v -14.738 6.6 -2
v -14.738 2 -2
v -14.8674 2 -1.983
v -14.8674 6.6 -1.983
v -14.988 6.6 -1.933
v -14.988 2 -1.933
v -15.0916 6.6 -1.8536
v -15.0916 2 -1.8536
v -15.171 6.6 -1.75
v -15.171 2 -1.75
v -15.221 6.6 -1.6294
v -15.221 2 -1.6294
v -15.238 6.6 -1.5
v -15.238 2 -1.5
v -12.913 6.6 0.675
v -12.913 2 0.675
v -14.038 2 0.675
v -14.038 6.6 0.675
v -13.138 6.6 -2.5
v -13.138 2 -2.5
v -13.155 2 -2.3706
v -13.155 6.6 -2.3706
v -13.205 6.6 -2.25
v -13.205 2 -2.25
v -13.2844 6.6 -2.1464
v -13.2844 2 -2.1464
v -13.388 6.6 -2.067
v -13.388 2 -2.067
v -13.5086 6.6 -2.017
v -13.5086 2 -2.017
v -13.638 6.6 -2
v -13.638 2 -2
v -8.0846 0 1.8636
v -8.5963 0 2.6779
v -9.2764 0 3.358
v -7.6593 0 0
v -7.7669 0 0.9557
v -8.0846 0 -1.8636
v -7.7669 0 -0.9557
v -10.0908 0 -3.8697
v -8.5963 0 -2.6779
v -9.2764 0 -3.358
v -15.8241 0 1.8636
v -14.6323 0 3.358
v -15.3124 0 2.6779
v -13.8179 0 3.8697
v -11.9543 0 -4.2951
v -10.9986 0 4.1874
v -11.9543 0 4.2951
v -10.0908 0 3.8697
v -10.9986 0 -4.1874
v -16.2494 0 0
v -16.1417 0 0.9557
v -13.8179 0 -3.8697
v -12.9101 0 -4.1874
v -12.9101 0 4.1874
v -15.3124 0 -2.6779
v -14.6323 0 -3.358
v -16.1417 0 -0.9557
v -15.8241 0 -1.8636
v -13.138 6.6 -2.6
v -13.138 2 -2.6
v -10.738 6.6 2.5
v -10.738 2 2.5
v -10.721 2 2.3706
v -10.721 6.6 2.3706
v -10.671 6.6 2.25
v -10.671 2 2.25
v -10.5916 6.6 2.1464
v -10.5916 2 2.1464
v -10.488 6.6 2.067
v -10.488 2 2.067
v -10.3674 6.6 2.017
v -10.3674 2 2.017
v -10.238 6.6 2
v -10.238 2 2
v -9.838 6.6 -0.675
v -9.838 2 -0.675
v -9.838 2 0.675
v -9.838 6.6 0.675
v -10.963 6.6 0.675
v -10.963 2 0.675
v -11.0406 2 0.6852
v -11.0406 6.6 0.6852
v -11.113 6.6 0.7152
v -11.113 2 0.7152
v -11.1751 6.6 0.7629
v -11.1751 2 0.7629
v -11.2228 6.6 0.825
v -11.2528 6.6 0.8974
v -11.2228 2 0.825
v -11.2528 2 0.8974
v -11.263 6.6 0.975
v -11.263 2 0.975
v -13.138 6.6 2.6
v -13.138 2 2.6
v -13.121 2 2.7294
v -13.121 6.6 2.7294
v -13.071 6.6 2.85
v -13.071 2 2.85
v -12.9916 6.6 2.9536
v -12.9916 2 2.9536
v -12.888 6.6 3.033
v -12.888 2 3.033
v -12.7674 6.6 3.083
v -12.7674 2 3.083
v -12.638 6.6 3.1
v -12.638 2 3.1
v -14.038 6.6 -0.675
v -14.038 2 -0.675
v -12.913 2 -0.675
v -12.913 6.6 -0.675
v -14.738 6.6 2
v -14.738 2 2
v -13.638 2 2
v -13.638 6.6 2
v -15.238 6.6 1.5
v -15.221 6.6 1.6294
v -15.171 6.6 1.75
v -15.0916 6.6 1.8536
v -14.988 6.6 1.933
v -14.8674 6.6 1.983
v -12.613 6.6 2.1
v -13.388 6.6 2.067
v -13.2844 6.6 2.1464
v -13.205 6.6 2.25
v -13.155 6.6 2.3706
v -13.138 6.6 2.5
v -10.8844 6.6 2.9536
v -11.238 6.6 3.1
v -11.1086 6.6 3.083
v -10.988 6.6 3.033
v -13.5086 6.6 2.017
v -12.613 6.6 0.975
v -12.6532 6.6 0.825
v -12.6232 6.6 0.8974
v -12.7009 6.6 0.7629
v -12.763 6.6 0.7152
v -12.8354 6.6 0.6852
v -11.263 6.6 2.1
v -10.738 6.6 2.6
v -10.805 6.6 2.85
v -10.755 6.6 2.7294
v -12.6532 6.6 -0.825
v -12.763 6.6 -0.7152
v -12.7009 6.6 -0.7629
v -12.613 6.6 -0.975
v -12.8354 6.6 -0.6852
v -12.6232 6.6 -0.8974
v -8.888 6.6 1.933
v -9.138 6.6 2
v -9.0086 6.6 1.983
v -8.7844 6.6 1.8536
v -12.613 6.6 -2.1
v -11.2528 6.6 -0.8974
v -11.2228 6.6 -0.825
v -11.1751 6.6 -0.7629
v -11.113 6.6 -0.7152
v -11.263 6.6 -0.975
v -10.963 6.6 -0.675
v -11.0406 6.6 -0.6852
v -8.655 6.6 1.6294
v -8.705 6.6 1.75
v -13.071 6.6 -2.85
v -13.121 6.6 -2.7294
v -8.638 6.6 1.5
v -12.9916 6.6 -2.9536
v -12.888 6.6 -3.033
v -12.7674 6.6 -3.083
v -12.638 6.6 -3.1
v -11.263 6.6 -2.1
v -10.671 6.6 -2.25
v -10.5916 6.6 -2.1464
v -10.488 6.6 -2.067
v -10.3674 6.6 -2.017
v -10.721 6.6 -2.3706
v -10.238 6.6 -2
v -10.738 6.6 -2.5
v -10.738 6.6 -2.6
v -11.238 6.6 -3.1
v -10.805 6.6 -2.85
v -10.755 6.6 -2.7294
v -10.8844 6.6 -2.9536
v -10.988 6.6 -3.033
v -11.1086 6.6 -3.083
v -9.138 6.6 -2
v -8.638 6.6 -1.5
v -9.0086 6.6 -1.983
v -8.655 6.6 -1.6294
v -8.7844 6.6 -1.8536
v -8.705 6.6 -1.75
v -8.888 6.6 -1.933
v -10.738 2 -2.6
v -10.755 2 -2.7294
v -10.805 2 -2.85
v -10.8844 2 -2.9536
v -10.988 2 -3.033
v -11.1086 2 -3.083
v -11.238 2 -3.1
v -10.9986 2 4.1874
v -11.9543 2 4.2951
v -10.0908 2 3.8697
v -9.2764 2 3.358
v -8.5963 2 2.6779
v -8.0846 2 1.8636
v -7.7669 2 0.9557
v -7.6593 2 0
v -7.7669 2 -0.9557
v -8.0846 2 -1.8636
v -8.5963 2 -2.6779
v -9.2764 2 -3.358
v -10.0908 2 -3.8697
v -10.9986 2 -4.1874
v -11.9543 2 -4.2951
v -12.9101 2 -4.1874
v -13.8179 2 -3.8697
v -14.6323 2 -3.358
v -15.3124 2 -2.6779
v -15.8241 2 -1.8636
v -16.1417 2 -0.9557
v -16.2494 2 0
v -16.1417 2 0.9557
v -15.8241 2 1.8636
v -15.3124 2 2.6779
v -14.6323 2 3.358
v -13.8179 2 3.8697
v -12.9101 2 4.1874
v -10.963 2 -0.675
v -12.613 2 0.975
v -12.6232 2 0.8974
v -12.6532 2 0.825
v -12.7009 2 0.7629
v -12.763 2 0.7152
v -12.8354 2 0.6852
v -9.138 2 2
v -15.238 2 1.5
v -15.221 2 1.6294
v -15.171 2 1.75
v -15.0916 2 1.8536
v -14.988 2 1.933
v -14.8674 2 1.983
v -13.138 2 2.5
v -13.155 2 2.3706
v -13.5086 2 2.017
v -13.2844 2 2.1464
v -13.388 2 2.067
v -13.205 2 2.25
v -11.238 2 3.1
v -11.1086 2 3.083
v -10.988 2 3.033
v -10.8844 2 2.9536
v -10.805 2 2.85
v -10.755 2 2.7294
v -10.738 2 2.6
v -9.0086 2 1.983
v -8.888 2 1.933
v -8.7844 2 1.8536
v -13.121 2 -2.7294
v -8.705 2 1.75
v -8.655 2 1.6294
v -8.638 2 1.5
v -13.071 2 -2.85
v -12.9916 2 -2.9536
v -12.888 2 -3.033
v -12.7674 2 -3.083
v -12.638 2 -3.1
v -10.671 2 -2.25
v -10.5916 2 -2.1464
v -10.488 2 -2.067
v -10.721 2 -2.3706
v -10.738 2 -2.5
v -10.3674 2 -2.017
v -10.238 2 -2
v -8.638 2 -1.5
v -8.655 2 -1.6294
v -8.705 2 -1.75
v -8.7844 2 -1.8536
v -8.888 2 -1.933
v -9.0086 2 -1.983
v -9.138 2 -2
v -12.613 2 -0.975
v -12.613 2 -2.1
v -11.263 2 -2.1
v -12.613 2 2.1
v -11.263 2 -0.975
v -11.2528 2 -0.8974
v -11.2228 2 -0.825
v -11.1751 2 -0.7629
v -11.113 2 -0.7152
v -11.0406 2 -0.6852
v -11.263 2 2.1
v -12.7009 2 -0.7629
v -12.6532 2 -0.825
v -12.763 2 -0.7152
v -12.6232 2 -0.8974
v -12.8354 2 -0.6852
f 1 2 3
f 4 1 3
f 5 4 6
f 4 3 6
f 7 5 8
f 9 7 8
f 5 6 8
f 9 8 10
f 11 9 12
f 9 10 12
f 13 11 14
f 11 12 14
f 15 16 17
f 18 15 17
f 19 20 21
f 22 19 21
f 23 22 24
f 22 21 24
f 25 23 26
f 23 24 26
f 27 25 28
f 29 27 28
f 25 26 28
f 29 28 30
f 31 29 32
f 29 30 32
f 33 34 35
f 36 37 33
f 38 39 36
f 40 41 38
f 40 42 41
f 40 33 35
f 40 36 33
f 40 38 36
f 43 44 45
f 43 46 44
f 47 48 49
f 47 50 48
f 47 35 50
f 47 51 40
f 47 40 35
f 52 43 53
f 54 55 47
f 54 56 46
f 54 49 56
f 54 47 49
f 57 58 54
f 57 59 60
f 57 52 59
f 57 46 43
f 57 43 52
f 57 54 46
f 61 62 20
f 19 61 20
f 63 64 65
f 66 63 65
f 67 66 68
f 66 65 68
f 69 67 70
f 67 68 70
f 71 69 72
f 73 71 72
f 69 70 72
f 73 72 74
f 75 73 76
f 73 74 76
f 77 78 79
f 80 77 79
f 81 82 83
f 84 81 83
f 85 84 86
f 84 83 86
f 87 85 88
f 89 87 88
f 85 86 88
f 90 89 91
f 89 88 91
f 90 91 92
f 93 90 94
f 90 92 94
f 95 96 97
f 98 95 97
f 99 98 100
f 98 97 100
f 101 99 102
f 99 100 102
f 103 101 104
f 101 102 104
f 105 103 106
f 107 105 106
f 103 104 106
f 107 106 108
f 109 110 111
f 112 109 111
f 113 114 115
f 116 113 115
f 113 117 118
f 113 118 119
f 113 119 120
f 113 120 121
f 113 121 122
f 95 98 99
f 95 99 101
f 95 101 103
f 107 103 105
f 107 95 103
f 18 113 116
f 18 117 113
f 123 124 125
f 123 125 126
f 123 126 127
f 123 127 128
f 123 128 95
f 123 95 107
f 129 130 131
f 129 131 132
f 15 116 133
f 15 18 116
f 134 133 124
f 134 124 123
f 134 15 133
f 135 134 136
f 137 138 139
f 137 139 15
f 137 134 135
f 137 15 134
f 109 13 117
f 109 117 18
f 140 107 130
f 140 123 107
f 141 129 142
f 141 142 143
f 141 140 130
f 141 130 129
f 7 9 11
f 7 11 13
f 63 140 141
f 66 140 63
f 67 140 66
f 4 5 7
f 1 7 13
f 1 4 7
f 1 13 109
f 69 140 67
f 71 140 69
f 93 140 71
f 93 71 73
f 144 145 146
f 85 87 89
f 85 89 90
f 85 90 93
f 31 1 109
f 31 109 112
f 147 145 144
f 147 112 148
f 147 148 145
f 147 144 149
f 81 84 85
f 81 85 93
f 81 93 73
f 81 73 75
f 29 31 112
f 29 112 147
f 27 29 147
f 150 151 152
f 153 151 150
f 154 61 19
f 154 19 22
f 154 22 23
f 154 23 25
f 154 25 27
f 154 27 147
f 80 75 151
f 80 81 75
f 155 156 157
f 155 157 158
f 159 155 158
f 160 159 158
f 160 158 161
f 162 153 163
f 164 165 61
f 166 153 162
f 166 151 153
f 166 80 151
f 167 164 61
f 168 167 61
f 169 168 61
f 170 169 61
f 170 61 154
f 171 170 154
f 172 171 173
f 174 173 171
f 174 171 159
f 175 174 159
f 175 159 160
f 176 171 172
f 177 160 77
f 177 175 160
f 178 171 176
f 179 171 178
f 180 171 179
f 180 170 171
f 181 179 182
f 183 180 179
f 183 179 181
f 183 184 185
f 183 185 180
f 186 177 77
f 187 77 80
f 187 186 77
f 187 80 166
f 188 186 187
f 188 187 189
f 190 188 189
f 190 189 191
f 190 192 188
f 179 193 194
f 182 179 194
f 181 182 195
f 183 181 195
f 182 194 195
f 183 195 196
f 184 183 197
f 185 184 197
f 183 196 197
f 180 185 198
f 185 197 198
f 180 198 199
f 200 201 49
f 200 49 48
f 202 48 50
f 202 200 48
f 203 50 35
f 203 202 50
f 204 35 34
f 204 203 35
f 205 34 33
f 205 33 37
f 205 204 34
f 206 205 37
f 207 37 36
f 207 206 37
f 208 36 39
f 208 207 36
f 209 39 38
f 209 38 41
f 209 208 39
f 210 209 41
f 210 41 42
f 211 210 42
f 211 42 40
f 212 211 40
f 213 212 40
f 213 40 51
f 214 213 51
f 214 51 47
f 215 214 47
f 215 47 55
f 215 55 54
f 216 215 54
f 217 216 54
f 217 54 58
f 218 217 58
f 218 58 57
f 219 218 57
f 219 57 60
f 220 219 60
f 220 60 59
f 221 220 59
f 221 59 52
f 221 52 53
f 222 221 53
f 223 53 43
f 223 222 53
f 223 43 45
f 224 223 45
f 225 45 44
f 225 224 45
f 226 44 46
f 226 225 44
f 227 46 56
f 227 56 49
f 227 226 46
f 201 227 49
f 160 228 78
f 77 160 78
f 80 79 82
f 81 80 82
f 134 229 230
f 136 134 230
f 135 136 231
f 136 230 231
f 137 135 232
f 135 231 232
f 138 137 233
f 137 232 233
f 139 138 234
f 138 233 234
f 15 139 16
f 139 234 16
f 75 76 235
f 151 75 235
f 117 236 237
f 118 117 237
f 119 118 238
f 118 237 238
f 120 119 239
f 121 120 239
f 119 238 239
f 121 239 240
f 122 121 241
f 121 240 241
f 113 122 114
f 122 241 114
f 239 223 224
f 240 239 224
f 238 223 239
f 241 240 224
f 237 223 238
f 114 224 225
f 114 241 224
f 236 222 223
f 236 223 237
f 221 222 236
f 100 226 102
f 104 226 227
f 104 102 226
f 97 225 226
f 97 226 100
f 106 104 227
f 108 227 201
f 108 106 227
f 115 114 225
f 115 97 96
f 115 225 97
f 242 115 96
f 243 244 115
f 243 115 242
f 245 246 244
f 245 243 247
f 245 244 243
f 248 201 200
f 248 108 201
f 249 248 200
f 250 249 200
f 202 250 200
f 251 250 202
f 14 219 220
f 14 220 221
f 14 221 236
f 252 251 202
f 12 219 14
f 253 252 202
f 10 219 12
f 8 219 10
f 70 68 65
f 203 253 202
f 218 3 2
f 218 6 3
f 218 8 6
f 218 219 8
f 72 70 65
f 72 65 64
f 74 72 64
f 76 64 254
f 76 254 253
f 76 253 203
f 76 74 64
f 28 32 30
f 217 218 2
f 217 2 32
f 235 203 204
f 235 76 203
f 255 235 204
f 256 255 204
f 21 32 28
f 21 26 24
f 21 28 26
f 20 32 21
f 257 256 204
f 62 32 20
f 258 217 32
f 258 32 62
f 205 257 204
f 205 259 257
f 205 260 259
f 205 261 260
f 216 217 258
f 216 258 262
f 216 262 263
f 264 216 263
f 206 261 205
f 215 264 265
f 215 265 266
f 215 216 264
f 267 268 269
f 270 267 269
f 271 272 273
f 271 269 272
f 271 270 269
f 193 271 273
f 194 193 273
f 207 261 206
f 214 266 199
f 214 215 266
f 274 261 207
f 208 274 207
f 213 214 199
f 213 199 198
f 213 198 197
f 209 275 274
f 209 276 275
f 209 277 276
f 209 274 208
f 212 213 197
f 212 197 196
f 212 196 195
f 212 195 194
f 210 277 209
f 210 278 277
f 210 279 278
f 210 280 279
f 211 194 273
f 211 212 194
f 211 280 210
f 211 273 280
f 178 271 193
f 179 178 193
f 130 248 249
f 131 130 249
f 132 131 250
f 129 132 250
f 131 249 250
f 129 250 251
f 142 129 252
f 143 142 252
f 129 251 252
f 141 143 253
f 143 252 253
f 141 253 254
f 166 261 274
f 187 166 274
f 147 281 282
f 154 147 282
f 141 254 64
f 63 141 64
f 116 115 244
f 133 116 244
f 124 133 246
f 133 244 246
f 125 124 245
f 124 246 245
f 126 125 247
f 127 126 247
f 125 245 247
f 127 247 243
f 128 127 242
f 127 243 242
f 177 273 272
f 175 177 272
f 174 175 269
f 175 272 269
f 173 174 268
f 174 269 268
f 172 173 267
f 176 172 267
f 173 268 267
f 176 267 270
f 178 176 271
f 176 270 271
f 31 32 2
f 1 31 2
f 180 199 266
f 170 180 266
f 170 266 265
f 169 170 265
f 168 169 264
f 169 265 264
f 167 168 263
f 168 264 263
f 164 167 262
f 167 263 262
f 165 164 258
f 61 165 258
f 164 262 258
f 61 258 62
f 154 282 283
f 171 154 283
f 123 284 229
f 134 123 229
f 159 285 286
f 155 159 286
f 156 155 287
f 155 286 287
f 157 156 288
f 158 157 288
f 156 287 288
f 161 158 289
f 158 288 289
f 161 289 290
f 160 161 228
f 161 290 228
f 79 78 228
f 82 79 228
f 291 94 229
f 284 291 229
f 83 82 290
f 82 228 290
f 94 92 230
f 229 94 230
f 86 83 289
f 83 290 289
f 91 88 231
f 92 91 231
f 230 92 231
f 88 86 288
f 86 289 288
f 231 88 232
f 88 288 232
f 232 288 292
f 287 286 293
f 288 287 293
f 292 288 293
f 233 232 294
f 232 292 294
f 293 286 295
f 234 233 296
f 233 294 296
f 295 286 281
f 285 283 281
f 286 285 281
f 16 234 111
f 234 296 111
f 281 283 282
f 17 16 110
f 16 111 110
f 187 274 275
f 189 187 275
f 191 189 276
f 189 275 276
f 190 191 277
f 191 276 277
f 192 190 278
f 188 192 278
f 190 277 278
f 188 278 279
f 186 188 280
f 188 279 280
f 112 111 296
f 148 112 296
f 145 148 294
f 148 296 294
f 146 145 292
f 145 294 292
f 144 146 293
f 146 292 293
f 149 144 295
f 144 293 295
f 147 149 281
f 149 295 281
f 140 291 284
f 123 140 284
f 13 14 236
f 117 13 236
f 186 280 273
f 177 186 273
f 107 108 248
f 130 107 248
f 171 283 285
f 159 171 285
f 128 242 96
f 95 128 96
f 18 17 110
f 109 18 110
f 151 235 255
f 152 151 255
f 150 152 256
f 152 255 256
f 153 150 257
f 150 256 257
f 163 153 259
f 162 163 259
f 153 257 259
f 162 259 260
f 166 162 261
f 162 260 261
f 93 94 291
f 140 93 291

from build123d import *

# Parameters (mm, degrees)
BUTTON_TOP_DEPTH        = 1.8
BUTTON_WALLS_DEPTH      = 4.8
OFFSET_2_DEPTH          = 0.2
STEM_START              = 0.2
STEM_HOUSING_DEPTH      = 4.6
SPOKES_DEPTH            = 0.2
CHAMFER1_SIZE           = 1.5
SKETCH11_R              = 47.776797093
SKETCH11_R_2            = 4.295081168
CUT_EXTRUDE1_DEPTH      = 10
CUT_EXTRUDE1_DEPTH_BACK = 10


with BuildPart() as part:
    # Sketch1 → button top (new body)
    with BuildSketch(Plane(origin=(0, 0, 0), x_dir=(1, 0, 0), z_dir=(0, 1, 0))):
        with BuildLine():
            Line((17, -12), (-17, -12))
            ThreePointArc((-17, -12), (-29, 0), (-17, 12))
            Line((-17, 12), (17, 12))
            ThreePointArc((17, 12), (29, 0), (17, -12))
        make_face()
    extrude(amount=BUTTON_TOP_DEPTH)

    # Sketch2 → button walls (add)
    with BuildSketch(Plane(origin=(0, 1.8, 0), x_dir=(1, 0, 0), z_dir=(0, 1, 0))):
        with BuildLine():
            Line((-17, 12), (17, 12))
            ThreePointArc((17, 12), (29, 0), (17, -12))
            Line((17, -12), (-17, -12))
            ThreePointArc((-17, -12), (-29, 0), (-17, 12))
        make_face()
        with BuildLine():
            Line((-17, 10.2), (17, 10.2))
            ThreePointArc((17, 10.2), (27.2, 0), (17, -10.2))
            Line((17, -10.2), (-17, -10.2))
            ThreePointArc((-17, -10.2), (-27.2, 0), (-17, 10.2))
        make_face(mode=Mode.SUBTRACT)
    extrude(amount=BUTTON_WALLS_DEPTH)

    # Sketch5 → offset 2 (add)
    with BuildSketch(Plane(origin=(0, 1.8, 0), x_dir=(1, 0, 0), z_dir=(0, 1, 0))):
        with BuildLine():
            Line((-12, 5), (12, 5))
            ThreePointArc((12, 5), (17, 0), (12, -5))
            Line((12, -5), (-12, -5))
            ThreePointArc((-12, -5), (-17, 0), (-12, 5))
        make_face()
    extrude(amount=OFFSET_2_DEPTH)

    # Sketch3 → stem housing (add)
    with BuildSketch(Plane(origin=(0, 1.8, 0), x_dir=(1, 0, 0), z_dir=(0, 1, 0)).offset(STEM_START)):
        with BuildLine():
            Line((-3.6, 2.6), (-3.6, -2.6))
            Line((-3.6, -2.6), (-1.496662955, -2.6))
            ThreePointArc((-1.496662955, -2.6), (0, -3), (1.496662955, -2.6))
            Line((1.496662955, -2.6), (3.6, -2.6))
            Line((3.6, -2.6), (3.6, 2.6))
            Line((3.6, 2.6), (1.496662955, 2.6))
            ThreePointArc((1.496662955, 2.6), (0, 3), (-1.496662955, 2.6))
            Line((-1.496662955, 2.6), (-3.6, 2.6))
        make_face()
        with BuildLine():
            Line((-0.675, 0.975), (-0.675, 2.1))
            Line((-0.675, 2.1), (0.675, 2.1))
            Line((0.675, 2.1), (0.675, 0.975))
            ThreePointArc((0.675, 0.975), (0.762867966, 0.762867966), (0.975, 0.675))
            Line((0.975, 0.675), (2.1, 0.675))
            Line((2.1, 0.675), (2.1, -0.675))
            Line((2.1, -0.675), (0.975, -0.675))
            ThreePointArc((0.975, -0.675), (0.762867966, -0.762867966), (0.675, -0.975))
            Line((0.675, -0.975), (0.675, -2.1))
            Line((0.675, -2.1), (-0.675, -2.1))
            Line((-0.675, -2.1), (-0.675, -0.975))
            ThreePointArc((-0.675, -0.975), (-0.762867966, -0.762867966), (-0.975, -0.675))
            Line((-0.975, -0.675), (-2.1, -0.675))
            Line((-2.1, -0.675), (-2.1, 0.675))
            Line((-2.1, 0.675), (-0.975, 0.675))
            ThreePointArc((-0.975, 0.675), (-0.762867966, 0.762867966), (-0.675, 0.975))
        make_face(mode=Mode.SUBTRACT)
        with BuildLine():
            ThreePointArc((14.738, -2), (15.091553391, -1.853553391), (15.238, -1.5))
            Line((15.238, -1.5), (15.238, 1.5))
            ThreePointArc((15.238, 1.5), (15.091553391, 1.853553391), (14.738, 2))
            Line((14.738, 2), (13.638, 2))
            ThreePointArc((13.638, 2), (13.284446609, 2.146446609), (13.138, 2.5))
            Line((13.138, 2.5), (13.138, 2.6))
            ThreePointArc((13.138, 2.6), (12.991553391, 2.953553391), (12.638, 3.1))
            Line((12.638, 3.1), (11.238, 3.1))
            ThreePointArc((11.238, 3.1), (10.884446609, 2.953553391), (10.738, 2.6))
            Line((10.738, 2.6), (10.738, 2.5))
            ThreePointArc((10.738, 2.5), (10.591553391, 2.146446609), (10.238, 2))
            Line((10.238, 2), (9.138, 2))
            ThreePointArc((9.138, 2), (8.784446609, 1.853553391), (8.638, 1.5))
            Line((8.638, 1.5), (8.638, -1.5))
            ThreePointArc((8.638, -1.5), (8.784446609, -1.853553391), (9.138, -2))
            Line((9.138, -2), (10.238, -2))
            ThreePointArc((10.238, -2), (10.591553391, -2.146446609), (10.738, -2.5))
            Line((10.738, -2.5), (10.738, -2.6))
            ThreePointArc((10.738, -2.6), (10.884446609, -2.953553391), (11.238, -3.1))
            Line((11.238, -3.1), (12.638, -3.1))
            ThreePointArc((12.638, -3.1), (12.991553391, -2.953553391), (13.138, -2.6))
            Line((13.138, -2.6), (13.138, -2.5))
            ThreePointArc((13.138, -2.5), (13.284446609, -2.146446609), (13.638, -2))
            Line((13.638, -2), (14.738, -2))
        make_face()
        with BuildLine():
            Line((14.038, 0.675), (14.038, -0.675))
            Line((14.038, -0.675), (12.913, -0.675))
            ThreePointArc((12.913, -0.675), (12.700867966, -0.762867966), (12.613, -0.975))
            Line((12.613, -0.975), (12.613, -2.1))
            Line((12.613, -2.1), (11.263, -2.1))
            Line((11.263, -2.1), (11.263, -0.975))
            ThreePointArc((11.263, -0.975), (11.175132034, -0.762867966), (10.963, -0.675))
            Line((10.963, -0.675), (9.838, -0.675))
            Line((9.838, -0.675), (9.838, 0.675))
            Line((9.838, 0.675), (10.963, 0.675))
            ThreePointArc((10.963, 0.675), (11.175132034, 0.762867966), (11.263, 0.975))
            Line((11.263, 0.975), (11.263, 2.1))
            Line((11.263, 2.1), (12.613, 2.1))
            Line((12.613, 2.1), (12.613, 0.975))
            ThreePointArc((12.613, 0.975), (12.700867966, 0.762867966), (12.913, 0.675))
            Line((12.913, 0.675), (14.038, 0.675))
        make_face(mode=Mode.SUBTRACT)
        with BuildLine():
            Line((-13.138, 2.6), (-13.138, 2.5))
            ThreePointArc((-13.138, 2.5), (-13.284446609, 2.146446609), (-13.638, 2))
            Line((-13.638, 2), (-14.738, 2))
            ThreePointArc((-14.738, 2), (-15.091553391, 1.853553391), (-15.238, 1.5))
            Line((-15.238, 1.5), (-15.238, -1.5))
            ThreePointArc((-15.238, -1.5), (-15.091553391, -1.853553391), (-14.738, -2))
            Line((-14.738, -2), (-13.638, -2))
            ThreePointArc((-13.638, -2), (-13.284446609, -2.146446609), (-13.138, -2.5))
            Line((-13.138, -2.5), (-13.138, -2.6))
            ThreePointArc((-13.138, -2.6), (-12.991553391, -2.953553391), (-12.638, -3.1))
            Line((-12.638, -3.1), (-11.238, -3.1))
            ThreePointArc((-11.238, -3.1), (-10.884446609, -2.953553391), (-10.738, -2.6))
            Line((-10.738, -2.6), (-10.738, -2.5))
            ThreePointArc((-10.738, -2.5), (-10.591553391, -2.146446609), (-10.238, -2))
            Line((-10.238, -2), (-9.138, -2))
            ThreePointArc((-9.138, -2), (-8.784446609, -1.853553391), (-8.638, -1.5))
            Line((-8.638, -1.5), (-8.638, 1.5))
            ThreePointArc((-8.638, 1.5), (-8.784446609, 1.853553391), (-9.138, 2))
            Line((-9.138, 2), (-10.238, 2))
            ThreePointArc((-10.238, 2), (-10.591553391, 2.146446609), (-10.738, 2.5))
            Line((-10.738, 2.5), (-10.738, 2.6))
            ThreePointArc((-10.738, 2.6), (-10.884446609, 2.953553391), (-11.238, 3.1))
            Line((-11.238, 3.1), (-12.638, 3.1))
            ThreePointArc((-12.638, 3.1), (-12.991553391, 2.953553391), (-13.138, 2.6))
        make_face()
        with BuildLine():
            ThreePointArc((-12.913, 0.675), (-12.700867966, 0.762867966), (-12.613, 0.975))
            Line((-12.613, 0.975), (-12.613, 2.1))
            Line((-12.613, 2.1), (-11.263, 2.1))
            Line((-11.263, 2.1), (-11.263, 0.975))
            ThreePointArc((-11.263, 0.975), (-11.175132034, 0.762867966), (-10.963, 0.675))
            Line((-10.963, 0.675), (-9.838, 0.675))
            Line((-9.838, 0.675), (-9.838, -0.675))
            Line((-9.838, -0.675), (-10.963, -0.675))
            ThreePointArc((-10.963, -0.675), (-11.175132034, -0.762867966), (-11.263, -0.975))
            Line((-11.263, -0.975), (-11.263, -2.1))
            Line((-11.263, -2.1), (-12.613, -2.1))
            Line((-12.613, -2.1), (-12.613, -0.975))
            ThreePointArc((-12.613, -0.975), (-12.700867966, -0.762867966), (-12.913, -0.675))
            Line((-12.913, -0.675), (-14.038, -0.675))
            Line((-14.038, -0.675), (-14.038, 0.675))
            Line((-14.038, 0.675), (-12.913, 0.675))
        make_face(mode=Mode.SUBTRACT)
    extrude(amount=STEM_HOUSING_DEPTH)

    # Sketch4 → spokes (add)
    with BuildSketch(Plane(origin=(0, 1.8, 0), x_dir=(1, 0, 0), z_dir=(0, 1, 0))):
        with BuildLine():
            Line((-0.8, 3), (-0.8, 10.2))
            ThreePointArc((-0.8, 10.2), (0, 11), (0.8, 10.2))
            Line((0.8, 10.2), (0.8, 3))
            ThreePointArc((0.8, 3), (0, 2.2), (-0.8, 3))
        make_face()
        with BuildLine():
            Line((17, -0.8), (27.2, -0.8))
            ThreePointArc((27.2, -0.8), (28, 0), (27.2, 0.8))
            Line((27.2, 0.8), (17, 0.8))
            ThreePointArc((17, 0.8), (16.2, 0), (17, -0.8))
        make_face()
        with BuildLine():
            Line((11.2, 3.1), (11.2, 10.2))
            ThreePointArc((11.2, 10.2), (12, 11), (12.8, 10.2))
            Line((12.8, 10.2), (12.8, 3.1))
            ThreePointArc((12.8, 3.1), (12, 2.3), (11.2, 3.1))
        make_face()
        with BuildLine():
            Line((-12.8, 3.1), (-12.8, 10.2))
            ThreePointArc((-12.8, 10.2), (-12, 11), (-11.2, 10.2))
            Line((-11.2, 10.2), (-11.2, 3.1))
            ThreePointArc((-11.2, 3.1), (-12, 2.3), (-12.8, 3.1))
        make_face()
        with BuildLine():
            Line((-17, -0.8), (-27.2, -0.8))
            ThreePointArc((-27.2, -0.8), (-28, 0), (-27.2, 0.8))
            Line((-27.2, 0.8), (-17, 0.8))
            ThreePointArc((-17, 0.8), (-16.2, 0), (-17, -0.8))
        make_face()
        with BuildLine():
            Line((-0.8, -3), (-0.8, -10.2))
            ThreePointArc((-0.8, -10.2), (0, -11), (0.8, -10.2))
            Line((0.8, -10.2), (0.8, -3))
            ThreePointArc((0.8, -3), (0, -2.2), (-0.8, -3))
        make_face()
        with BuildLine():
            Line((11.2, -3.1), (11.2, -10.2))
            ThreePointArc((11.2, -10.2), (12, -11), (12.8, -10.2))
            Line((12.8, -10.2), (12.8, -3.1))
            ThreePointArc((12.8, -3.1), (12, -2.3), (11.2, -3.1))
        make_face()
        with BuildLine():
            Line((-12.8, -3.1), (-12.8, -10.2))
            ThreePointArc((-12.8, -10.2), (-12, -11), (-11.2, -10.2))
            Line((-11.2, -10.2), (-11.2, -3.1))
            ThreePointArc((-11.2, -3.1), (-12, -2.3), (-12.8, -3.1))
        make_face()
    extrude(amount=SPOKES_DEPTH)

    # Chamfer1
    chamfer1_edges = [part.edges().sort_by_distance(p)[0] for p in [
        (-27.2, 6.6, 0),
        (0, 6.6, 10.2),
        (27.2, 6.6, 0),
        (0, 6.6, -10.2),
    ]]
    chamfer(chamfer1_edges, length=CHAMFER1_SIZE)

    # Cut-Sweep1: sweep along a path in Sketch10
    with BuildLine(Plane.XZ) as cut_sweep1_path:
        Line((-17, 12), (17, 12))
        ThreePointArc((17, 12), (29, 0), (17, -12))
        Line((17, -12), (-17, -12))
        ThreePointArc((-17, -12), (-29, 0), (-17, 12))
    # Sketch6 → Cut-Sweep1 (sweep, cut)
    with BuildSketch(Plane.XY):
        with BuildLine():
            Line((-28.261522369, 0), (-28.461522369, 0.2))
            ThreePointArc((-28.461522369, 0.2), (-28.860054223, 0.79644507), (-29, 1.5))
            Line((-29, 1.5), (-29, 0))
            Line((-29, 0), (-28.261522369, 0))
        make_face()
    sweep(path=cut_sweep1_path.line, mode=Mode.SUBTRACT)

    # Sketch11 → Cut-Extrude1 (cut, two sides)
    with BuildSketch(Plane(origin=(0, 2, 0), x_dir=(1, 0, 0), z_dir=(0, 1, 0))) as cut_extrude1_sk:
        with Locations((-11.954336916, 0)):
            Circle(SKETCH11_R)
        with Locations(Location((-11.954336916, 0, 0), (0, 0, 270))):
            Circle(SKETCH11_R_2, mode=Mode.SUBTRACT)
    extrude(amount=CUT_EXTRUDE1_DEPTH, mode=Mode.SUBTRACT)
    extrude(cut_extrude1_sk.sketch, amount=-CUT_EXTRUDE1_DEPTH_BACK, mode=Mode.SUBTRACT)


solid = part.part
